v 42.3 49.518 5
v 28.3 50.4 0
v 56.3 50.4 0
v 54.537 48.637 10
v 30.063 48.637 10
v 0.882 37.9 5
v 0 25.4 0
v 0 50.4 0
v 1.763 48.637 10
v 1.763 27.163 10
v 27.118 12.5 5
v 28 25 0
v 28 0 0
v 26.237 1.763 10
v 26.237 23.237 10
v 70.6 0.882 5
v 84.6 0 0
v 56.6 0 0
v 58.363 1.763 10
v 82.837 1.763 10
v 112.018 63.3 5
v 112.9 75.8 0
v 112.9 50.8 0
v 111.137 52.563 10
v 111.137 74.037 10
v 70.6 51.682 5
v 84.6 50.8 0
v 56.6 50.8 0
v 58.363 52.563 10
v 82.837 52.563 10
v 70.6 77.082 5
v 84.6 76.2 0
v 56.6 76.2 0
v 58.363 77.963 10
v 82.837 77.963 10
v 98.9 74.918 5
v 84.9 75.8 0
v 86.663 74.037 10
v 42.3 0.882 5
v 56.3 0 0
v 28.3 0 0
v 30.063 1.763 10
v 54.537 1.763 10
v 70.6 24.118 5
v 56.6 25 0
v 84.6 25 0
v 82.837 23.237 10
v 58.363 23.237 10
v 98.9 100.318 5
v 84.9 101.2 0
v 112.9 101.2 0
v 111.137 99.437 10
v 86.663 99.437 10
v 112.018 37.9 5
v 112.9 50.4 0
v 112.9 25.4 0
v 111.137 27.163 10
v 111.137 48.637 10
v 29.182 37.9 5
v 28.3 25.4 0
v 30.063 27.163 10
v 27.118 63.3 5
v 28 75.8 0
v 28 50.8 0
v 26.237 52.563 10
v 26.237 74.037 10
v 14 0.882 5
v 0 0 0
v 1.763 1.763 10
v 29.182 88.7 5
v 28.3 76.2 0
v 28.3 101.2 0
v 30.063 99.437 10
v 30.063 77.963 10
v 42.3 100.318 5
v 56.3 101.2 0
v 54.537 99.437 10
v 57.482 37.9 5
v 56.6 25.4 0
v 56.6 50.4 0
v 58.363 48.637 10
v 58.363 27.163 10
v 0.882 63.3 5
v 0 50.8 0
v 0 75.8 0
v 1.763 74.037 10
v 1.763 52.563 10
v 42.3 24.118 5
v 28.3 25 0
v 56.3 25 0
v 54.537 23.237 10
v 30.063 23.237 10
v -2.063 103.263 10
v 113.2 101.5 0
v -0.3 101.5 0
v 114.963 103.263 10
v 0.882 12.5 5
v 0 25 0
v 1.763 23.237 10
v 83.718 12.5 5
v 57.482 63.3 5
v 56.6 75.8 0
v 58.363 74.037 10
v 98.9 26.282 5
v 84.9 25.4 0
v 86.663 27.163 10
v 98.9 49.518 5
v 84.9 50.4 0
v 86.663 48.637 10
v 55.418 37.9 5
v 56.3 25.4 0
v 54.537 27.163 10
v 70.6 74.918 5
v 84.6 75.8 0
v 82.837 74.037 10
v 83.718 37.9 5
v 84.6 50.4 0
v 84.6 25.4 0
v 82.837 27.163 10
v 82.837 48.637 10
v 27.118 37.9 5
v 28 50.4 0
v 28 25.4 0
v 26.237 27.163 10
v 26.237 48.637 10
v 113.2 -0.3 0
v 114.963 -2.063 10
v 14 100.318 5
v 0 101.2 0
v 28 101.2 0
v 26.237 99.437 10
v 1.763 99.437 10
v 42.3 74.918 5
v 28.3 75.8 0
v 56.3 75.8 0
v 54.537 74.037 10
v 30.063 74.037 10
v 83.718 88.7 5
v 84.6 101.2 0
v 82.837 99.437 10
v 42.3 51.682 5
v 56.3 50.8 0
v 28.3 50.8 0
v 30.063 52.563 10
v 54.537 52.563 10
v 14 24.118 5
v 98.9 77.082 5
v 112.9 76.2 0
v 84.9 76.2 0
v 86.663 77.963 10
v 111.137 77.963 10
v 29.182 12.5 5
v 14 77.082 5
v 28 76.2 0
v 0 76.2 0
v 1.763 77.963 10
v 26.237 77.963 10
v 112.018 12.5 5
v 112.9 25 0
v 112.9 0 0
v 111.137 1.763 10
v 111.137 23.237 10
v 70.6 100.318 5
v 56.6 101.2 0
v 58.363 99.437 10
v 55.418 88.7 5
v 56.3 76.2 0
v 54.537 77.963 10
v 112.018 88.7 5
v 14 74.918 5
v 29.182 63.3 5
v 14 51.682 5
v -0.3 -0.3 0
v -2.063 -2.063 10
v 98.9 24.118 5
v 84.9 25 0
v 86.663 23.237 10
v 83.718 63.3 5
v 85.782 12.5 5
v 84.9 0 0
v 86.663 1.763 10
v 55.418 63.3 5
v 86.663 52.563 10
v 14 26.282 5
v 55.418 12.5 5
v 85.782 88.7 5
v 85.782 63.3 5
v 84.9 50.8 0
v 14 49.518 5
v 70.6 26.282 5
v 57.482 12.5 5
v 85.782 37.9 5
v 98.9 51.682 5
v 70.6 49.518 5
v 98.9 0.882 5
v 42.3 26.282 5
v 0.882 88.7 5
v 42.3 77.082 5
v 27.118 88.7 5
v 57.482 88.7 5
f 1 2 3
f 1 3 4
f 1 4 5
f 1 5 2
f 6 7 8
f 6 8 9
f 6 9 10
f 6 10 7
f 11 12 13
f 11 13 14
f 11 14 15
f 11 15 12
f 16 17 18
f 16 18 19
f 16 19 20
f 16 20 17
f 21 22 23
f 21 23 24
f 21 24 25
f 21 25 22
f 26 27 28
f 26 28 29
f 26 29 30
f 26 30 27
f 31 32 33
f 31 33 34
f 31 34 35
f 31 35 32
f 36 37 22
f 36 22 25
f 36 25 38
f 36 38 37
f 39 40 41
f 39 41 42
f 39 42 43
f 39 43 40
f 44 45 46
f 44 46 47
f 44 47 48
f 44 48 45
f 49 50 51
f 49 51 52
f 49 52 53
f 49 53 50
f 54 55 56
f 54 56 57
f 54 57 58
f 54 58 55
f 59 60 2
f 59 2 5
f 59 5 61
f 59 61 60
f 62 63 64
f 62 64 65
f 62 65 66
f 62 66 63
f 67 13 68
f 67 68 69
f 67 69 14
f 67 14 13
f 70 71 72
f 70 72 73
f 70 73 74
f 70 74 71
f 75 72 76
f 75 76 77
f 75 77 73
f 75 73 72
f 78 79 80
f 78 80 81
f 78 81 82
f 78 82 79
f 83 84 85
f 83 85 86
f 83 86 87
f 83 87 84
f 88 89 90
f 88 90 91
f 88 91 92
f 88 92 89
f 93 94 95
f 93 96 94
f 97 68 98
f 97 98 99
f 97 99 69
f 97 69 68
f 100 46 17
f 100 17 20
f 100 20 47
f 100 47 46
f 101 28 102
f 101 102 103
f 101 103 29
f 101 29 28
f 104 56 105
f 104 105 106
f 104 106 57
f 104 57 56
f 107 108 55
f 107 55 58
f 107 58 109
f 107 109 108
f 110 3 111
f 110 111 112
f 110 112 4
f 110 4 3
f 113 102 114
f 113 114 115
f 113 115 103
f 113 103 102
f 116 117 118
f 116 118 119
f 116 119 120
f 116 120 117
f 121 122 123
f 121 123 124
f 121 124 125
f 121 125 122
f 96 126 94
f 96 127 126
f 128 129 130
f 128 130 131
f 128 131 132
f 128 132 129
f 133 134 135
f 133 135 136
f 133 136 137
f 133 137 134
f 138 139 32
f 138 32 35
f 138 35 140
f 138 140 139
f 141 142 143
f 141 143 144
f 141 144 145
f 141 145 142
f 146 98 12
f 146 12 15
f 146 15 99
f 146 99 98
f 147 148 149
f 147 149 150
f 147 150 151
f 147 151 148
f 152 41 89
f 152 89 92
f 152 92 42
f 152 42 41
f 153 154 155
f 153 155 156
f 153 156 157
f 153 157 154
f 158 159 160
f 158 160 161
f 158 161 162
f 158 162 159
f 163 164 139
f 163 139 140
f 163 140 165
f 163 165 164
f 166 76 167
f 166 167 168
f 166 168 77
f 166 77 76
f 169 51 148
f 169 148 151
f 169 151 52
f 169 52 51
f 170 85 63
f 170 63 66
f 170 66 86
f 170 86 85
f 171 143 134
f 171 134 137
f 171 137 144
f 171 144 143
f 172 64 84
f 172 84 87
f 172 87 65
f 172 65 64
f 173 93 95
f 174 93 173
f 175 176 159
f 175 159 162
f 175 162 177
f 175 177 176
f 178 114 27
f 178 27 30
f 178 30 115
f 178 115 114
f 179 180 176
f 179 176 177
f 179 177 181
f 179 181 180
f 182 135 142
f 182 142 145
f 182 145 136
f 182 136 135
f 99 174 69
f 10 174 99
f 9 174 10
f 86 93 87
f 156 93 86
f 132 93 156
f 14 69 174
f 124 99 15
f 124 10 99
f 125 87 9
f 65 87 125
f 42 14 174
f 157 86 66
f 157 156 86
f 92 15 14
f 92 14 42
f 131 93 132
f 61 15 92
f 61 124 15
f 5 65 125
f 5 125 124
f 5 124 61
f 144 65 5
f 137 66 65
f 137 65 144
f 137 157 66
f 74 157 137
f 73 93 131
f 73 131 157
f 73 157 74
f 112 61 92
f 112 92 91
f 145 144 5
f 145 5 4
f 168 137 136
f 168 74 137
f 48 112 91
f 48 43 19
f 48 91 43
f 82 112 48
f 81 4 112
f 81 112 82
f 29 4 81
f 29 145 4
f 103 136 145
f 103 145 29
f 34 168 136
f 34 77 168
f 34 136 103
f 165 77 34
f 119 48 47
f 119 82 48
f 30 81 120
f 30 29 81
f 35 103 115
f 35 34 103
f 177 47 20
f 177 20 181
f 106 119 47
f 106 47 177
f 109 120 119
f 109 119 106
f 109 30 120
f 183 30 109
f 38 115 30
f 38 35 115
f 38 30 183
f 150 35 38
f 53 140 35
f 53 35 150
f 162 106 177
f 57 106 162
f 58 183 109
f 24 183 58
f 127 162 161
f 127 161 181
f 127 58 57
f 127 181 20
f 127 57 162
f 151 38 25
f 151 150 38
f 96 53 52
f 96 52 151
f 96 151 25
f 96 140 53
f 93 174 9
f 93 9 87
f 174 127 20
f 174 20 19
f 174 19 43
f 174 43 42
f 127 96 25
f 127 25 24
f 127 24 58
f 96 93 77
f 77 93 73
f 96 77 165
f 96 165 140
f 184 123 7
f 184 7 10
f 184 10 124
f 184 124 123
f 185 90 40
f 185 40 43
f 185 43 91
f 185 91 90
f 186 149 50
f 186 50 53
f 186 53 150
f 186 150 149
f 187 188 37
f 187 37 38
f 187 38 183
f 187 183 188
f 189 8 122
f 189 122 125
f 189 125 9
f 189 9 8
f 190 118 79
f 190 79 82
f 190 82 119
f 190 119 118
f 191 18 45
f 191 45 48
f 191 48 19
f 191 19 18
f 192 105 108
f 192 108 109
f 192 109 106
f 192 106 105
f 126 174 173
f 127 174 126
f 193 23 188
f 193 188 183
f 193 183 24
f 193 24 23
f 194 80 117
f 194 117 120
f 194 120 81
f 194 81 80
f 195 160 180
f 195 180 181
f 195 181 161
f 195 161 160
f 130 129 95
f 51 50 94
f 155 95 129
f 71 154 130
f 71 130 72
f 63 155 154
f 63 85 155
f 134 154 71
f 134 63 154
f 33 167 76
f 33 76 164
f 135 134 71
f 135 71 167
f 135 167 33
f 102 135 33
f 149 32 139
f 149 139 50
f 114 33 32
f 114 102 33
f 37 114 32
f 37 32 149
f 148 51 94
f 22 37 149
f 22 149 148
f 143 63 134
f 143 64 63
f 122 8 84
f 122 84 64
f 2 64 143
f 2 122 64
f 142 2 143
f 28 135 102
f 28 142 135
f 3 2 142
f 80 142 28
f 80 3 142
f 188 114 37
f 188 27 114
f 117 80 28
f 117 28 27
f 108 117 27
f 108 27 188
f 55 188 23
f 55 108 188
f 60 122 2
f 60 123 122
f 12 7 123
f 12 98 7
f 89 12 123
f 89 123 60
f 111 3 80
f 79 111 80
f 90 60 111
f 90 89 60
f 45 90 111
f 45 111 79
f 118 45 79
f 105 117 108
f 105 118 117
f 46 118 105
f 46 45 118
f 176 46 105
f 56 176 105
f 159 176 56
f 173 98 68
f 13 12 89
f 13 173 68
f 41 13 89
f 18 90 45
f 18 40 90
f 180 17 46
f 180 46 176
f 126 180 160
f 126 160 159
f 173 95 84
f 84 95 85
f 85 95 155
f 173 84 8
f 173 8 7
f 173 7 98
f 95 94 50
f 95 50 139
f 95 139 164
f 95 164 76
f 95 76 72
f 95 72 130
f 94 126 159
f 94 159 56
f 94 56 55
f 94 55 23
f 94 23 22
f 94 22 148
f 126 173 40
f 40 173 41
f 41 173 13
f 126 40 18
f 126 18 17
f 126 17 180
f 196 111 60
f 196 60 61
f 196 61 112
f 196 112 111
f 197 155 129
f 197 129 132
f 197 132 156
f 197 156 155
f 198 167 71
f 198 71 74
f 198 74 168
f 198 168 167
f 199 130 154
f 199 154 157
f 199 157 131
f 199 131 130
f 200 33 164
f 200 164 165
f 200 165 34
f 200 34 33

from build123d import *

# Parameters (mm, degrees)
F0_W     = 28
F0_H     = 0.3
F0_W_2   = 28.3
F0_H_2   = 0.2
F0_H_3   = 0.1
F0_W_3   = 0.3
F1_DEPTH = 10
F1_TAPER = -10


with BuildPart() as f1:
    # F0 (on Top) → F1 (new body)
    with BuildSketch(Plane.XY):
        Polygon((28, 0), (0, 0), (0, 25), (28, 25), (28, 25.1), (-0.3, 25.1), (-0.3, -0.3), (28, -0.3), align=None)
        with Locations((42.3, -0.15)):
            Rectangle(F0_W, F0_H)
        with Locations((13.85, 25.2)):
            Rectangle(F0_W_2, F0_H_2)
        with Locations((13.85, 50.6)):
            Rectangle(F0_W_2, F0_H_2)
        Polygon((-0.3, 101.5), (-0.3, 76.1), (28, 76.1), (28, 76.2), (0, 76.2), (0, 101.2), (28, 101.2), (28, 101.5), align=None)
        with Locations((13.85, 76)):
            Rectangle(F0_W_2, F0_H_2)
        with Locations((42.3, 101.35)):
            Rectangle(F0_W, F0_H)
        with Locations((70.6, -0.15)):
            Rectangle(F0_W, F0_H)
        with Locations((70.6, 101.35)):
            Rectangle(F0_W, F0_H)
        Polygon((84.9, 0), (84.9, -0.3), (113.2, -0.3), (113.2, 25.1), (84.9, 25.1), (84.9, 25), (112.9, 25), (112.9, 0), align=None)
        with Locations((99.05, 25.2)):
            Rectangle(F0_W_2, F0_H_2)
        with Locations((99.05, 50.6)):
            Rectangle(F0_W_2, F0_H_2)
        with Locations((99.05, 76)):
            Rectangle(F0_W_2, F0_H_2)
        Polygon((84.9, 76.1), (113.2, 76.1), (113.2, 101.5), (84.9, 101.5), (84.9, 101.2), (112.9, 101.2), (112.9, 76.2), (84.9, 76.2), align=None)
        Polygon((-0.3, 25.3), (28, 25.3), (28, 25.4), (0, 25.4), (0, 50.4), (28, 50.4), (28, 50.5), (-0.3, 50.5), align=None)
        Polygon((-0.3, 75.9), (-0.3, 50.7), (28, 50.7), (28, 50.8), (0, 50.8), (0, 75.8), (28, 75.8), (28, 75.9), align=None)
        Polygon((84.9, 25.4), (84.9, 25.3), (113.2, 25.3), (113.2, 50.5), (84.9, 50.5), (84.9, 50.4), (112.9, 50.4), (112.9, 25.4), align=None)
        Polygon((84.9, 50.7), (113.2, 50.7), (113.2, 75.9), (84.9, 75.9), (84.9, 75.8), (112.9, 75.8), (112.9, 50.8), (84.9, 50.8), align=None)
        Polygon((28, 25), (28, 0), (28, -0.3), (28.3, -0.3), (28.3, 0), (28.3, 25), (28.3, 25.1), (28, 25.1), align=None)
        Polygon((28, 76.2), (28, 76.1), (28.3, 76.1), (28.3, 76.2), (28.3, 101.2), (28.3, 101.5), (28, 101.5), (28, 101.2), align=None)
        Polygon((84.6, 0), (84.6, -0.3), (84.9, -0.3), (84.9, 0), (84.9, 25), (84.9, 25.1), (84.6, 25.1), (84.6, 25), align=None)
        Polygon((84.6, 76.2), (84.6, 76.1), (84.9, 76.1), (84.9, 76.2), (84.9, 101.2), (84.9, 101.5), (84.6, 101.5), (84.6, 101.2), align=None)
        Polygon((56.3, 0), (56.3, -0.3), (56.6, -0.3), (56.6, 0), (56.6, 25), (56.6, 25.1), (56.3, 25.1), (56.3, 25), align=None)
        Polygon((56.3, 76.2), (56.3, 76.1), (56.6, 76.1), (56.6, 76.2), (56.6, 101.2), (56.6, 101.5), (56.3, 101.5), (56.3, 101.2), align=None)
        with Locations((42.3, 25.35)):
            Rectangle(F0_W, F0_H_3)
        with Locations((70.6, 25.35)):
            Rectangle(F0_W, F0_H_3)
        Polygon((28, 25.4), (28, 25.3), (28.3, 25.3), (28.3, 25.4), (28.3, 50.4), (28.3, 50.5), (28, 50.5), (28, 50.4), align=None)
        Polygon((28, 50.8), (28, 50.7), (28.3, 50.7), (28.3, 50.8), (28.3, 75.8), (28.3, 75.9), (28, 75.9), (28, 75.8), align=None)
        with Locations((42.3, 25.2)):
            Rectangle(F0_W, F0_H_2)
        with Locations((70.6, 25.05)):
            Rectangle(F0_W, F0_H_3)
        with Locations((70.6, 50.75)):
            Rectangle(F0_W, F0_H_3)
        with Locations((70.6, 75.85)):
            Rectangle(F0_W, F0_H_3)
        with Locations((42.3, 50.6)):
            Rectangle(F0_W, F0_H_2)
        with Locations((42.3, 75.85)):
            Rectangle(F0_W, F0_H_3)
        Polygon((84.6, 25.4), (84.6, 25.3), (84.9, 25.3), (84.9, 25.4), (84.9, 50.4), (84.9, 50.5), (84.6, 50.5), (84.6, 50.4), align=None)
        Polygon((84.6, 50.8), (84.6, 50.7), (84.9, 50.7), (84.9, 50.8), (84.9, 75.8), (84.9, 75.9), (84.6, 75.9), (84.6, 75.8), align=None)
        with Locations((42.3, 25.05)):
            Rectangle(F0_W, F0_H_3)
        with Locations((70.6, 25.2)):
            Rectangle(F0_W, F0_H_2)
        Polygon((56.3, 25.4), (56.3, 25.3), (56.6, 25.3), (56.6, 25.4), (56.6, 50.4), (56.6, 50.5), (56.3, 50.5), (56.3, 50.4), align=None)
        Polygon((56.3, 50.8), (56.3, 50.7), (56.6, 50.7), (56.6, 50.8), (56.6, 75.8), (56.6, 75.9), (56.3, 75.9), (56.3, 75.8), align=None)
        with Locations((70.6, 50.6)):
            Rectangle(F0_W, F0_H_2)
        with Locations((42.3, 50.45)):
            Rectangle(F0_W, F0_H_3)
        with Locations((70.6, 76)):
            Rectangle(F0_W, F0_H_2)
        with Locations((42.3, 76)):
            Rectangle(F0_W, F0_H_2)
        with Locations((70.6, 76.15)):
            Rectangle(F0_W, F0_H_3)
        with Locations((42.3, 76.15)):
            Rectangle(F0_W, F0_H_3)
        with Locations((42.3, 50.75)):
            Rectangle(F0_W, F0_H_3)
        with Locations((70.6, 50.45)):
            Rectangle(F0_W, F0_H_3)
        with Locations((84.75, 76)):
            Rectangle(F0_W_3, F0_H_2)
        with Locations((56.45, 76)):
            Rectangle(F0_W_3, F0_H_2)
        with Locations((28.15, 76)):
            Rectangle(F0_W_3, F0_H_2)
        with Locations((84.75, 25.2)):
            Rectangle(F0_W_3, F0_H_2)
        with Locations((84.75, 50.6)):
            Rectangle(F0_W_3, F0_H_2)
        with Locations((28.15, 50.6)):
            Rectangle(F0_W_3, F0_H_2)
        with Locations((56.45, 50.6)):
            Rectangle(F0_W_3, F0_H_2)
        with Locations((56.45, 25.2)):
            Rectangle(F0_W_3, F0_H_2)
        with Locations((28.15, 25.2)):
            Rectangle(F0_W_3, F0_H_2)
    extrude(amount=F1_DEPTH, taper=F1_TAPER)


solid = f1.part
